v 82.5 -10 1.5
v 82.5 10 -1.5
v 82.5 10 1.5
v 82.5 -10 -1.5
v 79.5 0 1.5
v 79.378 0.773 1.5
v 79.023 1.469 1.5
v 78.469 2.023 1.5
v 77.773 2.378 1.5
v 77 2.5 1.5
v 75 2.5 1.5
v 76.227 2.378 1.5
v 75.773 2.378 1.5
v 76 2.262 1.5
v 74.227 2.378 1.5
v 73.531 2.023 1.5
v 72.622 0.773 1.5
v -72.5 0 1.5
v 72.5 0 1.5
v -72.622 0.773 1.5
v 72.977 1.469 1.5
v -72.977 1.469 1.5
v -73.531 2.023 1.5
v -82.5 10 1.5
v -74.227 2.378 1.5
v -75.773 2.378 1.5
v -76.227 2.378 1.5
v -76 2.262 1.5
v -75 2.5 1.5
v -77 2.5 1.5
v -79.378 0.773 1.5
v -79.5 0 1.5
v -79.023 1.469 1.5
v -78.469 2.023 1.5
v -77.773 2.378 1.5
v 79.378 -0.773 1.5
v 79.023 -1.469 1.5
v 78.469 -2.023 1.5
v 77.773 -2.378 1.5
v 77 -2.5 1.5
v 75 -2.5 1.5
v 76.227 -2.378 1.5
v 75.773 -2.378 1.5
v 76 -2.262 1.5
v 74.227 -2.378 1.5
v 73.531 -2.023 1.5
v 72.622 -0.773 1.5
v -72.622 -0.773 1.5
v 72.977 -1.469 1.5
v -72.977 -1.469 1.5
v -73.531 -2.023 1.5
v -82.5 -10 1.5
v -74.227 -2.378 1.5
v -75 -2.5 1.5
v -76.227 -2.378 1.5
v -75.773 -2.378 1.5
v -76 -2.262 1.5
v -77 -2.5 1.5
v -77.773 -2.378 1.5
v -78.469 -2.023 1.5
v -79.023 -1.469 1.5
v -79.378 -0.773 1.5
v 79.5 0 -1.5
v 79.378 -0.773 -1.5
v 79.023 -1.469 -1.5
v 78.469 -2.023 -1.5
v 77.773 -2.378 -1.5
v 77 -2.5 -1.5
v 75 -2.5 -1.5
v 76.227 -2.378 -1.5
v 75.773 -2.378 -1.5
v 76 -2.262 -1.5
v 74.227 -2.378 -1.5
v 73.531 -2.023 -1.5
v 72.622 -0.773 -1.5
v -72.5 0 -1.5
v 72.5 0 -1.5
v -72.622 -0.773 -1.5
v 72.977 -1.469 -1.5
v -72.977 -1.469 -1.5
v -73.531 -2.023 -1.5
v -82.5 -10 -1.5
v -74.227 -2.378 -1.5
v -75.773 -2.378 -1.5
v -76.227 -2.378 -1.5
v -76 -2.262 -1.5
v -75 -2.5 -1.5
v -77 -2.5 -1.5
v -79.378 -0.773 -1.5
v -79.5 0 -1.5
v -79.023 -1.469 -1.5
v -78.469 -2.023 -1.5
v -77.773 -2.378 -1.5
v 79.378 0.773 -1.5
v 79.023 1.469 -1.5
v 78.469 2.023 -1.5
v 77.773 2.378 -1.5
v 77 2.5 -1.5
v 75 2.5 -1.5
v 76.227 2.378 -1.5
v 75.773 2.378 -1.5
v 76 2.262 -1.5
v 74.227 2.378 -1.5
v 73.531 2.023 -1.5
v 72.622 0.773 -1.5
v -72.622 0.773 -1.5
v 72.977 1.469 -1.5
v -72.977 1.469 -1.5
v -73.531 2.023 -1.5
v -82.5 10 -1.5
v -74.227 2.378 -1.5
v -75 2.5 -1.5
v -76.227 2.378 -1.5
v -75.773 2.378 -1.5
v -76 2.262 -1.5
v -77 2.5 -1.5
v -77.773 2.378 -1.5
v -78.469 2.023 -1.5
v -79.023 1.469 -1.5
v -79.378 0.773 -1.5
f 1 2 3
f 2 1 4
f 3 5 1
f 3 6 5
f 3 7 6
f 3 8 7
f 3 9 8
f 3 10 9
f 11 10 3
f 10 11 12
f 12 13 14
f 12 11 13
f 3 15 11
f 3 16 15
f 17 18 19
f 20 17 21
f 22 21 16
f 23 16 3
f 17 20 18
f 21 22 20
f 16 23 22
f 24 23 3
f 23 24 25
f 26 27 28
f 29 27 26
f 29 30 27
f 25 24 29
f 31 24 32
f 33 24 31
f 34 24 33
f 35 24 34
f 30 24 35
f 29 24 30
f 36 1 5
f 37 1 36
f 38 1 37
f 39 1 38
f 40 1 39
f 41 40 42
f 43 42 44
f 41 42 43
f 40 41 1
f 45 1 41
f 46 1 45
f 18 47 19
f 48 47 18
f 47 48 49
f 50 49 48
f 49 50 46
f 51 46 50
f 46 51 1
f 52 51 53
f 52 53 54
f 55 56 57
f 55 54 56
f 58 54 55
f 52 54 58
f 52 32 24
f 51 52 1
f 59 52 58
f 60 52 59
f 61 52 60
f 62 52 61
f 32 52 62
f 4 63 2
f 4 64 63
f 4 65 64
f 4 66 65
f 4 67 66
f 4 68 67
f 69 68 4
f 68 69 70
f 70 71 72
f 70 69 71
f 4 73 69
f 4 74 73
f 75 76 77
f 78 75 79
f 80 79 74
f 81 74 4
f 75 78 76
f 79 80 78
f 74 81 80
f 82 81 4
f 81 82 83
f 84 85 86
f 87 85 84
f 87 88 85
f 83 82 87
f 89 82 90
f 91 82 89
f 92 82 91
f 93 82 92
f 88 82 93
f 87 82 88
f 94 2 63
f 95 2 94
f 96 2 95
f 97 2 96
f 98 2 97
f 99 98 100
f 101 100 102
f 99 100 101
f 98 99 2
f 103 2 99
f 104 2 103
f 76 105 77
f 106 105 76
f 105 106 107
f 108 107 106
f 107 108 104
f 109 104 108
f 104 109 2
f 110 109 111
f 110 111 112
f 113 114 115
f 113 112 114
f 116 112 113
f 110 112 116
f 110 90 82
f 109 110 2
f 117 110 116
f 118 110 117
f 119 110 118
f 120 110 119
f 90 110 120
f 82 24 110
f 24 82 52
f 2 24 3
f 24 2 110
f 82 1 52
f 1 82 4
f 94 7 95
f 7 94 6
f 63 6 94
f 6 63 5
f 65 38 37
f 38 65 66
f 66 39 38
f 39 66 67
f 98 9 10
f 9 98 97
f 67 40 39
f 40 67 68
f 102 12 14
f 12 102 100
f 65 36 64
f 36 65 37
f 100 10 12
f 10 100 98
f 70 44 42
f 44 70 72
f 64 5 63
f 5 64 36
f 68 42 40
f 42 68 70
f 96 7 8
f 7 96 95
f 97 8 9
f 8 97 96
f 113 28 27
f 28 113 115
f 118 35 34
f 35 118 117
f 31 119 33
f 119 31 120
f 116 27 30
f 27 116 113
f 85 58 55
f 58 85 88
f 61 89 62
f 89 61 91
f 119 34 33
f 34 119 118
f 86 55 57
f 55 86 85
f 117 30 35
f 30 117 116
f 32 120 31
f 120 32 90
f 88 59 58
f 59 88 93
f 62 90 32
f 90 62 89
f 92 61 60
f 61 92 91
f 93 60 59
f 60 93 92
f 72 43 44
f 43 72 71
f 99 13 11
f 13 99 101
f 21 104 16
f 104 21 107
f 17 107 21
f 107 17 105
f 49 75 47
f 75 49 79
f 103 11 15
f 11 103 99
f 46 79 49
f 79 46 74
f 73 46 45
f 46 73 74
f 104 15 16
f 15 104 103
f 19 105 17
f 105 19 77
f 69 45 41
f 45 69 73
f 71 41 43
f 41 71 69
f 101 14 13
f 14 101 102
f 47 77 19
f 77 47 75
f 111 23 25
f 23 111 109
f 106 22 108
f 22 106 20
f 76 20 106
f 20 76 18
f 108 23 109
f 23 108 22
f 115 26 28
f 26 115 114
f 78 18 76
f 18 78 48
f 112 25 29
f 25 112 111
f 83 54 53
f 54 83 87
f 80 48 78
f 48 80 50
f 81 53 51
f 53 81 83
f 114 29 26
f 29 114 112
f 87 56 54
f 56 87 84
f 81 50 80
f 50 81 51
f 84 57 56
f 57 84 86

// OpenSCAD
$fn = 20;
difference()
{
	cube([165,20, 3], center=true);	
	translate([77, 0, 0])
	{
		cylinder(r = 2.5, h = 3, center=true);
	}
	translate([-77, 0, 0])
	{
		cylinder(r = 2.5, h = 3, center=true);
	}

	translate([75, 0, 0])
	{
		cylinder(r = 2.5, h = 3, center=true);
	}
	translate([-75, 0, 0])
	{
		cylinder(r = 2.5, h = 3, center=true);
	}
}
